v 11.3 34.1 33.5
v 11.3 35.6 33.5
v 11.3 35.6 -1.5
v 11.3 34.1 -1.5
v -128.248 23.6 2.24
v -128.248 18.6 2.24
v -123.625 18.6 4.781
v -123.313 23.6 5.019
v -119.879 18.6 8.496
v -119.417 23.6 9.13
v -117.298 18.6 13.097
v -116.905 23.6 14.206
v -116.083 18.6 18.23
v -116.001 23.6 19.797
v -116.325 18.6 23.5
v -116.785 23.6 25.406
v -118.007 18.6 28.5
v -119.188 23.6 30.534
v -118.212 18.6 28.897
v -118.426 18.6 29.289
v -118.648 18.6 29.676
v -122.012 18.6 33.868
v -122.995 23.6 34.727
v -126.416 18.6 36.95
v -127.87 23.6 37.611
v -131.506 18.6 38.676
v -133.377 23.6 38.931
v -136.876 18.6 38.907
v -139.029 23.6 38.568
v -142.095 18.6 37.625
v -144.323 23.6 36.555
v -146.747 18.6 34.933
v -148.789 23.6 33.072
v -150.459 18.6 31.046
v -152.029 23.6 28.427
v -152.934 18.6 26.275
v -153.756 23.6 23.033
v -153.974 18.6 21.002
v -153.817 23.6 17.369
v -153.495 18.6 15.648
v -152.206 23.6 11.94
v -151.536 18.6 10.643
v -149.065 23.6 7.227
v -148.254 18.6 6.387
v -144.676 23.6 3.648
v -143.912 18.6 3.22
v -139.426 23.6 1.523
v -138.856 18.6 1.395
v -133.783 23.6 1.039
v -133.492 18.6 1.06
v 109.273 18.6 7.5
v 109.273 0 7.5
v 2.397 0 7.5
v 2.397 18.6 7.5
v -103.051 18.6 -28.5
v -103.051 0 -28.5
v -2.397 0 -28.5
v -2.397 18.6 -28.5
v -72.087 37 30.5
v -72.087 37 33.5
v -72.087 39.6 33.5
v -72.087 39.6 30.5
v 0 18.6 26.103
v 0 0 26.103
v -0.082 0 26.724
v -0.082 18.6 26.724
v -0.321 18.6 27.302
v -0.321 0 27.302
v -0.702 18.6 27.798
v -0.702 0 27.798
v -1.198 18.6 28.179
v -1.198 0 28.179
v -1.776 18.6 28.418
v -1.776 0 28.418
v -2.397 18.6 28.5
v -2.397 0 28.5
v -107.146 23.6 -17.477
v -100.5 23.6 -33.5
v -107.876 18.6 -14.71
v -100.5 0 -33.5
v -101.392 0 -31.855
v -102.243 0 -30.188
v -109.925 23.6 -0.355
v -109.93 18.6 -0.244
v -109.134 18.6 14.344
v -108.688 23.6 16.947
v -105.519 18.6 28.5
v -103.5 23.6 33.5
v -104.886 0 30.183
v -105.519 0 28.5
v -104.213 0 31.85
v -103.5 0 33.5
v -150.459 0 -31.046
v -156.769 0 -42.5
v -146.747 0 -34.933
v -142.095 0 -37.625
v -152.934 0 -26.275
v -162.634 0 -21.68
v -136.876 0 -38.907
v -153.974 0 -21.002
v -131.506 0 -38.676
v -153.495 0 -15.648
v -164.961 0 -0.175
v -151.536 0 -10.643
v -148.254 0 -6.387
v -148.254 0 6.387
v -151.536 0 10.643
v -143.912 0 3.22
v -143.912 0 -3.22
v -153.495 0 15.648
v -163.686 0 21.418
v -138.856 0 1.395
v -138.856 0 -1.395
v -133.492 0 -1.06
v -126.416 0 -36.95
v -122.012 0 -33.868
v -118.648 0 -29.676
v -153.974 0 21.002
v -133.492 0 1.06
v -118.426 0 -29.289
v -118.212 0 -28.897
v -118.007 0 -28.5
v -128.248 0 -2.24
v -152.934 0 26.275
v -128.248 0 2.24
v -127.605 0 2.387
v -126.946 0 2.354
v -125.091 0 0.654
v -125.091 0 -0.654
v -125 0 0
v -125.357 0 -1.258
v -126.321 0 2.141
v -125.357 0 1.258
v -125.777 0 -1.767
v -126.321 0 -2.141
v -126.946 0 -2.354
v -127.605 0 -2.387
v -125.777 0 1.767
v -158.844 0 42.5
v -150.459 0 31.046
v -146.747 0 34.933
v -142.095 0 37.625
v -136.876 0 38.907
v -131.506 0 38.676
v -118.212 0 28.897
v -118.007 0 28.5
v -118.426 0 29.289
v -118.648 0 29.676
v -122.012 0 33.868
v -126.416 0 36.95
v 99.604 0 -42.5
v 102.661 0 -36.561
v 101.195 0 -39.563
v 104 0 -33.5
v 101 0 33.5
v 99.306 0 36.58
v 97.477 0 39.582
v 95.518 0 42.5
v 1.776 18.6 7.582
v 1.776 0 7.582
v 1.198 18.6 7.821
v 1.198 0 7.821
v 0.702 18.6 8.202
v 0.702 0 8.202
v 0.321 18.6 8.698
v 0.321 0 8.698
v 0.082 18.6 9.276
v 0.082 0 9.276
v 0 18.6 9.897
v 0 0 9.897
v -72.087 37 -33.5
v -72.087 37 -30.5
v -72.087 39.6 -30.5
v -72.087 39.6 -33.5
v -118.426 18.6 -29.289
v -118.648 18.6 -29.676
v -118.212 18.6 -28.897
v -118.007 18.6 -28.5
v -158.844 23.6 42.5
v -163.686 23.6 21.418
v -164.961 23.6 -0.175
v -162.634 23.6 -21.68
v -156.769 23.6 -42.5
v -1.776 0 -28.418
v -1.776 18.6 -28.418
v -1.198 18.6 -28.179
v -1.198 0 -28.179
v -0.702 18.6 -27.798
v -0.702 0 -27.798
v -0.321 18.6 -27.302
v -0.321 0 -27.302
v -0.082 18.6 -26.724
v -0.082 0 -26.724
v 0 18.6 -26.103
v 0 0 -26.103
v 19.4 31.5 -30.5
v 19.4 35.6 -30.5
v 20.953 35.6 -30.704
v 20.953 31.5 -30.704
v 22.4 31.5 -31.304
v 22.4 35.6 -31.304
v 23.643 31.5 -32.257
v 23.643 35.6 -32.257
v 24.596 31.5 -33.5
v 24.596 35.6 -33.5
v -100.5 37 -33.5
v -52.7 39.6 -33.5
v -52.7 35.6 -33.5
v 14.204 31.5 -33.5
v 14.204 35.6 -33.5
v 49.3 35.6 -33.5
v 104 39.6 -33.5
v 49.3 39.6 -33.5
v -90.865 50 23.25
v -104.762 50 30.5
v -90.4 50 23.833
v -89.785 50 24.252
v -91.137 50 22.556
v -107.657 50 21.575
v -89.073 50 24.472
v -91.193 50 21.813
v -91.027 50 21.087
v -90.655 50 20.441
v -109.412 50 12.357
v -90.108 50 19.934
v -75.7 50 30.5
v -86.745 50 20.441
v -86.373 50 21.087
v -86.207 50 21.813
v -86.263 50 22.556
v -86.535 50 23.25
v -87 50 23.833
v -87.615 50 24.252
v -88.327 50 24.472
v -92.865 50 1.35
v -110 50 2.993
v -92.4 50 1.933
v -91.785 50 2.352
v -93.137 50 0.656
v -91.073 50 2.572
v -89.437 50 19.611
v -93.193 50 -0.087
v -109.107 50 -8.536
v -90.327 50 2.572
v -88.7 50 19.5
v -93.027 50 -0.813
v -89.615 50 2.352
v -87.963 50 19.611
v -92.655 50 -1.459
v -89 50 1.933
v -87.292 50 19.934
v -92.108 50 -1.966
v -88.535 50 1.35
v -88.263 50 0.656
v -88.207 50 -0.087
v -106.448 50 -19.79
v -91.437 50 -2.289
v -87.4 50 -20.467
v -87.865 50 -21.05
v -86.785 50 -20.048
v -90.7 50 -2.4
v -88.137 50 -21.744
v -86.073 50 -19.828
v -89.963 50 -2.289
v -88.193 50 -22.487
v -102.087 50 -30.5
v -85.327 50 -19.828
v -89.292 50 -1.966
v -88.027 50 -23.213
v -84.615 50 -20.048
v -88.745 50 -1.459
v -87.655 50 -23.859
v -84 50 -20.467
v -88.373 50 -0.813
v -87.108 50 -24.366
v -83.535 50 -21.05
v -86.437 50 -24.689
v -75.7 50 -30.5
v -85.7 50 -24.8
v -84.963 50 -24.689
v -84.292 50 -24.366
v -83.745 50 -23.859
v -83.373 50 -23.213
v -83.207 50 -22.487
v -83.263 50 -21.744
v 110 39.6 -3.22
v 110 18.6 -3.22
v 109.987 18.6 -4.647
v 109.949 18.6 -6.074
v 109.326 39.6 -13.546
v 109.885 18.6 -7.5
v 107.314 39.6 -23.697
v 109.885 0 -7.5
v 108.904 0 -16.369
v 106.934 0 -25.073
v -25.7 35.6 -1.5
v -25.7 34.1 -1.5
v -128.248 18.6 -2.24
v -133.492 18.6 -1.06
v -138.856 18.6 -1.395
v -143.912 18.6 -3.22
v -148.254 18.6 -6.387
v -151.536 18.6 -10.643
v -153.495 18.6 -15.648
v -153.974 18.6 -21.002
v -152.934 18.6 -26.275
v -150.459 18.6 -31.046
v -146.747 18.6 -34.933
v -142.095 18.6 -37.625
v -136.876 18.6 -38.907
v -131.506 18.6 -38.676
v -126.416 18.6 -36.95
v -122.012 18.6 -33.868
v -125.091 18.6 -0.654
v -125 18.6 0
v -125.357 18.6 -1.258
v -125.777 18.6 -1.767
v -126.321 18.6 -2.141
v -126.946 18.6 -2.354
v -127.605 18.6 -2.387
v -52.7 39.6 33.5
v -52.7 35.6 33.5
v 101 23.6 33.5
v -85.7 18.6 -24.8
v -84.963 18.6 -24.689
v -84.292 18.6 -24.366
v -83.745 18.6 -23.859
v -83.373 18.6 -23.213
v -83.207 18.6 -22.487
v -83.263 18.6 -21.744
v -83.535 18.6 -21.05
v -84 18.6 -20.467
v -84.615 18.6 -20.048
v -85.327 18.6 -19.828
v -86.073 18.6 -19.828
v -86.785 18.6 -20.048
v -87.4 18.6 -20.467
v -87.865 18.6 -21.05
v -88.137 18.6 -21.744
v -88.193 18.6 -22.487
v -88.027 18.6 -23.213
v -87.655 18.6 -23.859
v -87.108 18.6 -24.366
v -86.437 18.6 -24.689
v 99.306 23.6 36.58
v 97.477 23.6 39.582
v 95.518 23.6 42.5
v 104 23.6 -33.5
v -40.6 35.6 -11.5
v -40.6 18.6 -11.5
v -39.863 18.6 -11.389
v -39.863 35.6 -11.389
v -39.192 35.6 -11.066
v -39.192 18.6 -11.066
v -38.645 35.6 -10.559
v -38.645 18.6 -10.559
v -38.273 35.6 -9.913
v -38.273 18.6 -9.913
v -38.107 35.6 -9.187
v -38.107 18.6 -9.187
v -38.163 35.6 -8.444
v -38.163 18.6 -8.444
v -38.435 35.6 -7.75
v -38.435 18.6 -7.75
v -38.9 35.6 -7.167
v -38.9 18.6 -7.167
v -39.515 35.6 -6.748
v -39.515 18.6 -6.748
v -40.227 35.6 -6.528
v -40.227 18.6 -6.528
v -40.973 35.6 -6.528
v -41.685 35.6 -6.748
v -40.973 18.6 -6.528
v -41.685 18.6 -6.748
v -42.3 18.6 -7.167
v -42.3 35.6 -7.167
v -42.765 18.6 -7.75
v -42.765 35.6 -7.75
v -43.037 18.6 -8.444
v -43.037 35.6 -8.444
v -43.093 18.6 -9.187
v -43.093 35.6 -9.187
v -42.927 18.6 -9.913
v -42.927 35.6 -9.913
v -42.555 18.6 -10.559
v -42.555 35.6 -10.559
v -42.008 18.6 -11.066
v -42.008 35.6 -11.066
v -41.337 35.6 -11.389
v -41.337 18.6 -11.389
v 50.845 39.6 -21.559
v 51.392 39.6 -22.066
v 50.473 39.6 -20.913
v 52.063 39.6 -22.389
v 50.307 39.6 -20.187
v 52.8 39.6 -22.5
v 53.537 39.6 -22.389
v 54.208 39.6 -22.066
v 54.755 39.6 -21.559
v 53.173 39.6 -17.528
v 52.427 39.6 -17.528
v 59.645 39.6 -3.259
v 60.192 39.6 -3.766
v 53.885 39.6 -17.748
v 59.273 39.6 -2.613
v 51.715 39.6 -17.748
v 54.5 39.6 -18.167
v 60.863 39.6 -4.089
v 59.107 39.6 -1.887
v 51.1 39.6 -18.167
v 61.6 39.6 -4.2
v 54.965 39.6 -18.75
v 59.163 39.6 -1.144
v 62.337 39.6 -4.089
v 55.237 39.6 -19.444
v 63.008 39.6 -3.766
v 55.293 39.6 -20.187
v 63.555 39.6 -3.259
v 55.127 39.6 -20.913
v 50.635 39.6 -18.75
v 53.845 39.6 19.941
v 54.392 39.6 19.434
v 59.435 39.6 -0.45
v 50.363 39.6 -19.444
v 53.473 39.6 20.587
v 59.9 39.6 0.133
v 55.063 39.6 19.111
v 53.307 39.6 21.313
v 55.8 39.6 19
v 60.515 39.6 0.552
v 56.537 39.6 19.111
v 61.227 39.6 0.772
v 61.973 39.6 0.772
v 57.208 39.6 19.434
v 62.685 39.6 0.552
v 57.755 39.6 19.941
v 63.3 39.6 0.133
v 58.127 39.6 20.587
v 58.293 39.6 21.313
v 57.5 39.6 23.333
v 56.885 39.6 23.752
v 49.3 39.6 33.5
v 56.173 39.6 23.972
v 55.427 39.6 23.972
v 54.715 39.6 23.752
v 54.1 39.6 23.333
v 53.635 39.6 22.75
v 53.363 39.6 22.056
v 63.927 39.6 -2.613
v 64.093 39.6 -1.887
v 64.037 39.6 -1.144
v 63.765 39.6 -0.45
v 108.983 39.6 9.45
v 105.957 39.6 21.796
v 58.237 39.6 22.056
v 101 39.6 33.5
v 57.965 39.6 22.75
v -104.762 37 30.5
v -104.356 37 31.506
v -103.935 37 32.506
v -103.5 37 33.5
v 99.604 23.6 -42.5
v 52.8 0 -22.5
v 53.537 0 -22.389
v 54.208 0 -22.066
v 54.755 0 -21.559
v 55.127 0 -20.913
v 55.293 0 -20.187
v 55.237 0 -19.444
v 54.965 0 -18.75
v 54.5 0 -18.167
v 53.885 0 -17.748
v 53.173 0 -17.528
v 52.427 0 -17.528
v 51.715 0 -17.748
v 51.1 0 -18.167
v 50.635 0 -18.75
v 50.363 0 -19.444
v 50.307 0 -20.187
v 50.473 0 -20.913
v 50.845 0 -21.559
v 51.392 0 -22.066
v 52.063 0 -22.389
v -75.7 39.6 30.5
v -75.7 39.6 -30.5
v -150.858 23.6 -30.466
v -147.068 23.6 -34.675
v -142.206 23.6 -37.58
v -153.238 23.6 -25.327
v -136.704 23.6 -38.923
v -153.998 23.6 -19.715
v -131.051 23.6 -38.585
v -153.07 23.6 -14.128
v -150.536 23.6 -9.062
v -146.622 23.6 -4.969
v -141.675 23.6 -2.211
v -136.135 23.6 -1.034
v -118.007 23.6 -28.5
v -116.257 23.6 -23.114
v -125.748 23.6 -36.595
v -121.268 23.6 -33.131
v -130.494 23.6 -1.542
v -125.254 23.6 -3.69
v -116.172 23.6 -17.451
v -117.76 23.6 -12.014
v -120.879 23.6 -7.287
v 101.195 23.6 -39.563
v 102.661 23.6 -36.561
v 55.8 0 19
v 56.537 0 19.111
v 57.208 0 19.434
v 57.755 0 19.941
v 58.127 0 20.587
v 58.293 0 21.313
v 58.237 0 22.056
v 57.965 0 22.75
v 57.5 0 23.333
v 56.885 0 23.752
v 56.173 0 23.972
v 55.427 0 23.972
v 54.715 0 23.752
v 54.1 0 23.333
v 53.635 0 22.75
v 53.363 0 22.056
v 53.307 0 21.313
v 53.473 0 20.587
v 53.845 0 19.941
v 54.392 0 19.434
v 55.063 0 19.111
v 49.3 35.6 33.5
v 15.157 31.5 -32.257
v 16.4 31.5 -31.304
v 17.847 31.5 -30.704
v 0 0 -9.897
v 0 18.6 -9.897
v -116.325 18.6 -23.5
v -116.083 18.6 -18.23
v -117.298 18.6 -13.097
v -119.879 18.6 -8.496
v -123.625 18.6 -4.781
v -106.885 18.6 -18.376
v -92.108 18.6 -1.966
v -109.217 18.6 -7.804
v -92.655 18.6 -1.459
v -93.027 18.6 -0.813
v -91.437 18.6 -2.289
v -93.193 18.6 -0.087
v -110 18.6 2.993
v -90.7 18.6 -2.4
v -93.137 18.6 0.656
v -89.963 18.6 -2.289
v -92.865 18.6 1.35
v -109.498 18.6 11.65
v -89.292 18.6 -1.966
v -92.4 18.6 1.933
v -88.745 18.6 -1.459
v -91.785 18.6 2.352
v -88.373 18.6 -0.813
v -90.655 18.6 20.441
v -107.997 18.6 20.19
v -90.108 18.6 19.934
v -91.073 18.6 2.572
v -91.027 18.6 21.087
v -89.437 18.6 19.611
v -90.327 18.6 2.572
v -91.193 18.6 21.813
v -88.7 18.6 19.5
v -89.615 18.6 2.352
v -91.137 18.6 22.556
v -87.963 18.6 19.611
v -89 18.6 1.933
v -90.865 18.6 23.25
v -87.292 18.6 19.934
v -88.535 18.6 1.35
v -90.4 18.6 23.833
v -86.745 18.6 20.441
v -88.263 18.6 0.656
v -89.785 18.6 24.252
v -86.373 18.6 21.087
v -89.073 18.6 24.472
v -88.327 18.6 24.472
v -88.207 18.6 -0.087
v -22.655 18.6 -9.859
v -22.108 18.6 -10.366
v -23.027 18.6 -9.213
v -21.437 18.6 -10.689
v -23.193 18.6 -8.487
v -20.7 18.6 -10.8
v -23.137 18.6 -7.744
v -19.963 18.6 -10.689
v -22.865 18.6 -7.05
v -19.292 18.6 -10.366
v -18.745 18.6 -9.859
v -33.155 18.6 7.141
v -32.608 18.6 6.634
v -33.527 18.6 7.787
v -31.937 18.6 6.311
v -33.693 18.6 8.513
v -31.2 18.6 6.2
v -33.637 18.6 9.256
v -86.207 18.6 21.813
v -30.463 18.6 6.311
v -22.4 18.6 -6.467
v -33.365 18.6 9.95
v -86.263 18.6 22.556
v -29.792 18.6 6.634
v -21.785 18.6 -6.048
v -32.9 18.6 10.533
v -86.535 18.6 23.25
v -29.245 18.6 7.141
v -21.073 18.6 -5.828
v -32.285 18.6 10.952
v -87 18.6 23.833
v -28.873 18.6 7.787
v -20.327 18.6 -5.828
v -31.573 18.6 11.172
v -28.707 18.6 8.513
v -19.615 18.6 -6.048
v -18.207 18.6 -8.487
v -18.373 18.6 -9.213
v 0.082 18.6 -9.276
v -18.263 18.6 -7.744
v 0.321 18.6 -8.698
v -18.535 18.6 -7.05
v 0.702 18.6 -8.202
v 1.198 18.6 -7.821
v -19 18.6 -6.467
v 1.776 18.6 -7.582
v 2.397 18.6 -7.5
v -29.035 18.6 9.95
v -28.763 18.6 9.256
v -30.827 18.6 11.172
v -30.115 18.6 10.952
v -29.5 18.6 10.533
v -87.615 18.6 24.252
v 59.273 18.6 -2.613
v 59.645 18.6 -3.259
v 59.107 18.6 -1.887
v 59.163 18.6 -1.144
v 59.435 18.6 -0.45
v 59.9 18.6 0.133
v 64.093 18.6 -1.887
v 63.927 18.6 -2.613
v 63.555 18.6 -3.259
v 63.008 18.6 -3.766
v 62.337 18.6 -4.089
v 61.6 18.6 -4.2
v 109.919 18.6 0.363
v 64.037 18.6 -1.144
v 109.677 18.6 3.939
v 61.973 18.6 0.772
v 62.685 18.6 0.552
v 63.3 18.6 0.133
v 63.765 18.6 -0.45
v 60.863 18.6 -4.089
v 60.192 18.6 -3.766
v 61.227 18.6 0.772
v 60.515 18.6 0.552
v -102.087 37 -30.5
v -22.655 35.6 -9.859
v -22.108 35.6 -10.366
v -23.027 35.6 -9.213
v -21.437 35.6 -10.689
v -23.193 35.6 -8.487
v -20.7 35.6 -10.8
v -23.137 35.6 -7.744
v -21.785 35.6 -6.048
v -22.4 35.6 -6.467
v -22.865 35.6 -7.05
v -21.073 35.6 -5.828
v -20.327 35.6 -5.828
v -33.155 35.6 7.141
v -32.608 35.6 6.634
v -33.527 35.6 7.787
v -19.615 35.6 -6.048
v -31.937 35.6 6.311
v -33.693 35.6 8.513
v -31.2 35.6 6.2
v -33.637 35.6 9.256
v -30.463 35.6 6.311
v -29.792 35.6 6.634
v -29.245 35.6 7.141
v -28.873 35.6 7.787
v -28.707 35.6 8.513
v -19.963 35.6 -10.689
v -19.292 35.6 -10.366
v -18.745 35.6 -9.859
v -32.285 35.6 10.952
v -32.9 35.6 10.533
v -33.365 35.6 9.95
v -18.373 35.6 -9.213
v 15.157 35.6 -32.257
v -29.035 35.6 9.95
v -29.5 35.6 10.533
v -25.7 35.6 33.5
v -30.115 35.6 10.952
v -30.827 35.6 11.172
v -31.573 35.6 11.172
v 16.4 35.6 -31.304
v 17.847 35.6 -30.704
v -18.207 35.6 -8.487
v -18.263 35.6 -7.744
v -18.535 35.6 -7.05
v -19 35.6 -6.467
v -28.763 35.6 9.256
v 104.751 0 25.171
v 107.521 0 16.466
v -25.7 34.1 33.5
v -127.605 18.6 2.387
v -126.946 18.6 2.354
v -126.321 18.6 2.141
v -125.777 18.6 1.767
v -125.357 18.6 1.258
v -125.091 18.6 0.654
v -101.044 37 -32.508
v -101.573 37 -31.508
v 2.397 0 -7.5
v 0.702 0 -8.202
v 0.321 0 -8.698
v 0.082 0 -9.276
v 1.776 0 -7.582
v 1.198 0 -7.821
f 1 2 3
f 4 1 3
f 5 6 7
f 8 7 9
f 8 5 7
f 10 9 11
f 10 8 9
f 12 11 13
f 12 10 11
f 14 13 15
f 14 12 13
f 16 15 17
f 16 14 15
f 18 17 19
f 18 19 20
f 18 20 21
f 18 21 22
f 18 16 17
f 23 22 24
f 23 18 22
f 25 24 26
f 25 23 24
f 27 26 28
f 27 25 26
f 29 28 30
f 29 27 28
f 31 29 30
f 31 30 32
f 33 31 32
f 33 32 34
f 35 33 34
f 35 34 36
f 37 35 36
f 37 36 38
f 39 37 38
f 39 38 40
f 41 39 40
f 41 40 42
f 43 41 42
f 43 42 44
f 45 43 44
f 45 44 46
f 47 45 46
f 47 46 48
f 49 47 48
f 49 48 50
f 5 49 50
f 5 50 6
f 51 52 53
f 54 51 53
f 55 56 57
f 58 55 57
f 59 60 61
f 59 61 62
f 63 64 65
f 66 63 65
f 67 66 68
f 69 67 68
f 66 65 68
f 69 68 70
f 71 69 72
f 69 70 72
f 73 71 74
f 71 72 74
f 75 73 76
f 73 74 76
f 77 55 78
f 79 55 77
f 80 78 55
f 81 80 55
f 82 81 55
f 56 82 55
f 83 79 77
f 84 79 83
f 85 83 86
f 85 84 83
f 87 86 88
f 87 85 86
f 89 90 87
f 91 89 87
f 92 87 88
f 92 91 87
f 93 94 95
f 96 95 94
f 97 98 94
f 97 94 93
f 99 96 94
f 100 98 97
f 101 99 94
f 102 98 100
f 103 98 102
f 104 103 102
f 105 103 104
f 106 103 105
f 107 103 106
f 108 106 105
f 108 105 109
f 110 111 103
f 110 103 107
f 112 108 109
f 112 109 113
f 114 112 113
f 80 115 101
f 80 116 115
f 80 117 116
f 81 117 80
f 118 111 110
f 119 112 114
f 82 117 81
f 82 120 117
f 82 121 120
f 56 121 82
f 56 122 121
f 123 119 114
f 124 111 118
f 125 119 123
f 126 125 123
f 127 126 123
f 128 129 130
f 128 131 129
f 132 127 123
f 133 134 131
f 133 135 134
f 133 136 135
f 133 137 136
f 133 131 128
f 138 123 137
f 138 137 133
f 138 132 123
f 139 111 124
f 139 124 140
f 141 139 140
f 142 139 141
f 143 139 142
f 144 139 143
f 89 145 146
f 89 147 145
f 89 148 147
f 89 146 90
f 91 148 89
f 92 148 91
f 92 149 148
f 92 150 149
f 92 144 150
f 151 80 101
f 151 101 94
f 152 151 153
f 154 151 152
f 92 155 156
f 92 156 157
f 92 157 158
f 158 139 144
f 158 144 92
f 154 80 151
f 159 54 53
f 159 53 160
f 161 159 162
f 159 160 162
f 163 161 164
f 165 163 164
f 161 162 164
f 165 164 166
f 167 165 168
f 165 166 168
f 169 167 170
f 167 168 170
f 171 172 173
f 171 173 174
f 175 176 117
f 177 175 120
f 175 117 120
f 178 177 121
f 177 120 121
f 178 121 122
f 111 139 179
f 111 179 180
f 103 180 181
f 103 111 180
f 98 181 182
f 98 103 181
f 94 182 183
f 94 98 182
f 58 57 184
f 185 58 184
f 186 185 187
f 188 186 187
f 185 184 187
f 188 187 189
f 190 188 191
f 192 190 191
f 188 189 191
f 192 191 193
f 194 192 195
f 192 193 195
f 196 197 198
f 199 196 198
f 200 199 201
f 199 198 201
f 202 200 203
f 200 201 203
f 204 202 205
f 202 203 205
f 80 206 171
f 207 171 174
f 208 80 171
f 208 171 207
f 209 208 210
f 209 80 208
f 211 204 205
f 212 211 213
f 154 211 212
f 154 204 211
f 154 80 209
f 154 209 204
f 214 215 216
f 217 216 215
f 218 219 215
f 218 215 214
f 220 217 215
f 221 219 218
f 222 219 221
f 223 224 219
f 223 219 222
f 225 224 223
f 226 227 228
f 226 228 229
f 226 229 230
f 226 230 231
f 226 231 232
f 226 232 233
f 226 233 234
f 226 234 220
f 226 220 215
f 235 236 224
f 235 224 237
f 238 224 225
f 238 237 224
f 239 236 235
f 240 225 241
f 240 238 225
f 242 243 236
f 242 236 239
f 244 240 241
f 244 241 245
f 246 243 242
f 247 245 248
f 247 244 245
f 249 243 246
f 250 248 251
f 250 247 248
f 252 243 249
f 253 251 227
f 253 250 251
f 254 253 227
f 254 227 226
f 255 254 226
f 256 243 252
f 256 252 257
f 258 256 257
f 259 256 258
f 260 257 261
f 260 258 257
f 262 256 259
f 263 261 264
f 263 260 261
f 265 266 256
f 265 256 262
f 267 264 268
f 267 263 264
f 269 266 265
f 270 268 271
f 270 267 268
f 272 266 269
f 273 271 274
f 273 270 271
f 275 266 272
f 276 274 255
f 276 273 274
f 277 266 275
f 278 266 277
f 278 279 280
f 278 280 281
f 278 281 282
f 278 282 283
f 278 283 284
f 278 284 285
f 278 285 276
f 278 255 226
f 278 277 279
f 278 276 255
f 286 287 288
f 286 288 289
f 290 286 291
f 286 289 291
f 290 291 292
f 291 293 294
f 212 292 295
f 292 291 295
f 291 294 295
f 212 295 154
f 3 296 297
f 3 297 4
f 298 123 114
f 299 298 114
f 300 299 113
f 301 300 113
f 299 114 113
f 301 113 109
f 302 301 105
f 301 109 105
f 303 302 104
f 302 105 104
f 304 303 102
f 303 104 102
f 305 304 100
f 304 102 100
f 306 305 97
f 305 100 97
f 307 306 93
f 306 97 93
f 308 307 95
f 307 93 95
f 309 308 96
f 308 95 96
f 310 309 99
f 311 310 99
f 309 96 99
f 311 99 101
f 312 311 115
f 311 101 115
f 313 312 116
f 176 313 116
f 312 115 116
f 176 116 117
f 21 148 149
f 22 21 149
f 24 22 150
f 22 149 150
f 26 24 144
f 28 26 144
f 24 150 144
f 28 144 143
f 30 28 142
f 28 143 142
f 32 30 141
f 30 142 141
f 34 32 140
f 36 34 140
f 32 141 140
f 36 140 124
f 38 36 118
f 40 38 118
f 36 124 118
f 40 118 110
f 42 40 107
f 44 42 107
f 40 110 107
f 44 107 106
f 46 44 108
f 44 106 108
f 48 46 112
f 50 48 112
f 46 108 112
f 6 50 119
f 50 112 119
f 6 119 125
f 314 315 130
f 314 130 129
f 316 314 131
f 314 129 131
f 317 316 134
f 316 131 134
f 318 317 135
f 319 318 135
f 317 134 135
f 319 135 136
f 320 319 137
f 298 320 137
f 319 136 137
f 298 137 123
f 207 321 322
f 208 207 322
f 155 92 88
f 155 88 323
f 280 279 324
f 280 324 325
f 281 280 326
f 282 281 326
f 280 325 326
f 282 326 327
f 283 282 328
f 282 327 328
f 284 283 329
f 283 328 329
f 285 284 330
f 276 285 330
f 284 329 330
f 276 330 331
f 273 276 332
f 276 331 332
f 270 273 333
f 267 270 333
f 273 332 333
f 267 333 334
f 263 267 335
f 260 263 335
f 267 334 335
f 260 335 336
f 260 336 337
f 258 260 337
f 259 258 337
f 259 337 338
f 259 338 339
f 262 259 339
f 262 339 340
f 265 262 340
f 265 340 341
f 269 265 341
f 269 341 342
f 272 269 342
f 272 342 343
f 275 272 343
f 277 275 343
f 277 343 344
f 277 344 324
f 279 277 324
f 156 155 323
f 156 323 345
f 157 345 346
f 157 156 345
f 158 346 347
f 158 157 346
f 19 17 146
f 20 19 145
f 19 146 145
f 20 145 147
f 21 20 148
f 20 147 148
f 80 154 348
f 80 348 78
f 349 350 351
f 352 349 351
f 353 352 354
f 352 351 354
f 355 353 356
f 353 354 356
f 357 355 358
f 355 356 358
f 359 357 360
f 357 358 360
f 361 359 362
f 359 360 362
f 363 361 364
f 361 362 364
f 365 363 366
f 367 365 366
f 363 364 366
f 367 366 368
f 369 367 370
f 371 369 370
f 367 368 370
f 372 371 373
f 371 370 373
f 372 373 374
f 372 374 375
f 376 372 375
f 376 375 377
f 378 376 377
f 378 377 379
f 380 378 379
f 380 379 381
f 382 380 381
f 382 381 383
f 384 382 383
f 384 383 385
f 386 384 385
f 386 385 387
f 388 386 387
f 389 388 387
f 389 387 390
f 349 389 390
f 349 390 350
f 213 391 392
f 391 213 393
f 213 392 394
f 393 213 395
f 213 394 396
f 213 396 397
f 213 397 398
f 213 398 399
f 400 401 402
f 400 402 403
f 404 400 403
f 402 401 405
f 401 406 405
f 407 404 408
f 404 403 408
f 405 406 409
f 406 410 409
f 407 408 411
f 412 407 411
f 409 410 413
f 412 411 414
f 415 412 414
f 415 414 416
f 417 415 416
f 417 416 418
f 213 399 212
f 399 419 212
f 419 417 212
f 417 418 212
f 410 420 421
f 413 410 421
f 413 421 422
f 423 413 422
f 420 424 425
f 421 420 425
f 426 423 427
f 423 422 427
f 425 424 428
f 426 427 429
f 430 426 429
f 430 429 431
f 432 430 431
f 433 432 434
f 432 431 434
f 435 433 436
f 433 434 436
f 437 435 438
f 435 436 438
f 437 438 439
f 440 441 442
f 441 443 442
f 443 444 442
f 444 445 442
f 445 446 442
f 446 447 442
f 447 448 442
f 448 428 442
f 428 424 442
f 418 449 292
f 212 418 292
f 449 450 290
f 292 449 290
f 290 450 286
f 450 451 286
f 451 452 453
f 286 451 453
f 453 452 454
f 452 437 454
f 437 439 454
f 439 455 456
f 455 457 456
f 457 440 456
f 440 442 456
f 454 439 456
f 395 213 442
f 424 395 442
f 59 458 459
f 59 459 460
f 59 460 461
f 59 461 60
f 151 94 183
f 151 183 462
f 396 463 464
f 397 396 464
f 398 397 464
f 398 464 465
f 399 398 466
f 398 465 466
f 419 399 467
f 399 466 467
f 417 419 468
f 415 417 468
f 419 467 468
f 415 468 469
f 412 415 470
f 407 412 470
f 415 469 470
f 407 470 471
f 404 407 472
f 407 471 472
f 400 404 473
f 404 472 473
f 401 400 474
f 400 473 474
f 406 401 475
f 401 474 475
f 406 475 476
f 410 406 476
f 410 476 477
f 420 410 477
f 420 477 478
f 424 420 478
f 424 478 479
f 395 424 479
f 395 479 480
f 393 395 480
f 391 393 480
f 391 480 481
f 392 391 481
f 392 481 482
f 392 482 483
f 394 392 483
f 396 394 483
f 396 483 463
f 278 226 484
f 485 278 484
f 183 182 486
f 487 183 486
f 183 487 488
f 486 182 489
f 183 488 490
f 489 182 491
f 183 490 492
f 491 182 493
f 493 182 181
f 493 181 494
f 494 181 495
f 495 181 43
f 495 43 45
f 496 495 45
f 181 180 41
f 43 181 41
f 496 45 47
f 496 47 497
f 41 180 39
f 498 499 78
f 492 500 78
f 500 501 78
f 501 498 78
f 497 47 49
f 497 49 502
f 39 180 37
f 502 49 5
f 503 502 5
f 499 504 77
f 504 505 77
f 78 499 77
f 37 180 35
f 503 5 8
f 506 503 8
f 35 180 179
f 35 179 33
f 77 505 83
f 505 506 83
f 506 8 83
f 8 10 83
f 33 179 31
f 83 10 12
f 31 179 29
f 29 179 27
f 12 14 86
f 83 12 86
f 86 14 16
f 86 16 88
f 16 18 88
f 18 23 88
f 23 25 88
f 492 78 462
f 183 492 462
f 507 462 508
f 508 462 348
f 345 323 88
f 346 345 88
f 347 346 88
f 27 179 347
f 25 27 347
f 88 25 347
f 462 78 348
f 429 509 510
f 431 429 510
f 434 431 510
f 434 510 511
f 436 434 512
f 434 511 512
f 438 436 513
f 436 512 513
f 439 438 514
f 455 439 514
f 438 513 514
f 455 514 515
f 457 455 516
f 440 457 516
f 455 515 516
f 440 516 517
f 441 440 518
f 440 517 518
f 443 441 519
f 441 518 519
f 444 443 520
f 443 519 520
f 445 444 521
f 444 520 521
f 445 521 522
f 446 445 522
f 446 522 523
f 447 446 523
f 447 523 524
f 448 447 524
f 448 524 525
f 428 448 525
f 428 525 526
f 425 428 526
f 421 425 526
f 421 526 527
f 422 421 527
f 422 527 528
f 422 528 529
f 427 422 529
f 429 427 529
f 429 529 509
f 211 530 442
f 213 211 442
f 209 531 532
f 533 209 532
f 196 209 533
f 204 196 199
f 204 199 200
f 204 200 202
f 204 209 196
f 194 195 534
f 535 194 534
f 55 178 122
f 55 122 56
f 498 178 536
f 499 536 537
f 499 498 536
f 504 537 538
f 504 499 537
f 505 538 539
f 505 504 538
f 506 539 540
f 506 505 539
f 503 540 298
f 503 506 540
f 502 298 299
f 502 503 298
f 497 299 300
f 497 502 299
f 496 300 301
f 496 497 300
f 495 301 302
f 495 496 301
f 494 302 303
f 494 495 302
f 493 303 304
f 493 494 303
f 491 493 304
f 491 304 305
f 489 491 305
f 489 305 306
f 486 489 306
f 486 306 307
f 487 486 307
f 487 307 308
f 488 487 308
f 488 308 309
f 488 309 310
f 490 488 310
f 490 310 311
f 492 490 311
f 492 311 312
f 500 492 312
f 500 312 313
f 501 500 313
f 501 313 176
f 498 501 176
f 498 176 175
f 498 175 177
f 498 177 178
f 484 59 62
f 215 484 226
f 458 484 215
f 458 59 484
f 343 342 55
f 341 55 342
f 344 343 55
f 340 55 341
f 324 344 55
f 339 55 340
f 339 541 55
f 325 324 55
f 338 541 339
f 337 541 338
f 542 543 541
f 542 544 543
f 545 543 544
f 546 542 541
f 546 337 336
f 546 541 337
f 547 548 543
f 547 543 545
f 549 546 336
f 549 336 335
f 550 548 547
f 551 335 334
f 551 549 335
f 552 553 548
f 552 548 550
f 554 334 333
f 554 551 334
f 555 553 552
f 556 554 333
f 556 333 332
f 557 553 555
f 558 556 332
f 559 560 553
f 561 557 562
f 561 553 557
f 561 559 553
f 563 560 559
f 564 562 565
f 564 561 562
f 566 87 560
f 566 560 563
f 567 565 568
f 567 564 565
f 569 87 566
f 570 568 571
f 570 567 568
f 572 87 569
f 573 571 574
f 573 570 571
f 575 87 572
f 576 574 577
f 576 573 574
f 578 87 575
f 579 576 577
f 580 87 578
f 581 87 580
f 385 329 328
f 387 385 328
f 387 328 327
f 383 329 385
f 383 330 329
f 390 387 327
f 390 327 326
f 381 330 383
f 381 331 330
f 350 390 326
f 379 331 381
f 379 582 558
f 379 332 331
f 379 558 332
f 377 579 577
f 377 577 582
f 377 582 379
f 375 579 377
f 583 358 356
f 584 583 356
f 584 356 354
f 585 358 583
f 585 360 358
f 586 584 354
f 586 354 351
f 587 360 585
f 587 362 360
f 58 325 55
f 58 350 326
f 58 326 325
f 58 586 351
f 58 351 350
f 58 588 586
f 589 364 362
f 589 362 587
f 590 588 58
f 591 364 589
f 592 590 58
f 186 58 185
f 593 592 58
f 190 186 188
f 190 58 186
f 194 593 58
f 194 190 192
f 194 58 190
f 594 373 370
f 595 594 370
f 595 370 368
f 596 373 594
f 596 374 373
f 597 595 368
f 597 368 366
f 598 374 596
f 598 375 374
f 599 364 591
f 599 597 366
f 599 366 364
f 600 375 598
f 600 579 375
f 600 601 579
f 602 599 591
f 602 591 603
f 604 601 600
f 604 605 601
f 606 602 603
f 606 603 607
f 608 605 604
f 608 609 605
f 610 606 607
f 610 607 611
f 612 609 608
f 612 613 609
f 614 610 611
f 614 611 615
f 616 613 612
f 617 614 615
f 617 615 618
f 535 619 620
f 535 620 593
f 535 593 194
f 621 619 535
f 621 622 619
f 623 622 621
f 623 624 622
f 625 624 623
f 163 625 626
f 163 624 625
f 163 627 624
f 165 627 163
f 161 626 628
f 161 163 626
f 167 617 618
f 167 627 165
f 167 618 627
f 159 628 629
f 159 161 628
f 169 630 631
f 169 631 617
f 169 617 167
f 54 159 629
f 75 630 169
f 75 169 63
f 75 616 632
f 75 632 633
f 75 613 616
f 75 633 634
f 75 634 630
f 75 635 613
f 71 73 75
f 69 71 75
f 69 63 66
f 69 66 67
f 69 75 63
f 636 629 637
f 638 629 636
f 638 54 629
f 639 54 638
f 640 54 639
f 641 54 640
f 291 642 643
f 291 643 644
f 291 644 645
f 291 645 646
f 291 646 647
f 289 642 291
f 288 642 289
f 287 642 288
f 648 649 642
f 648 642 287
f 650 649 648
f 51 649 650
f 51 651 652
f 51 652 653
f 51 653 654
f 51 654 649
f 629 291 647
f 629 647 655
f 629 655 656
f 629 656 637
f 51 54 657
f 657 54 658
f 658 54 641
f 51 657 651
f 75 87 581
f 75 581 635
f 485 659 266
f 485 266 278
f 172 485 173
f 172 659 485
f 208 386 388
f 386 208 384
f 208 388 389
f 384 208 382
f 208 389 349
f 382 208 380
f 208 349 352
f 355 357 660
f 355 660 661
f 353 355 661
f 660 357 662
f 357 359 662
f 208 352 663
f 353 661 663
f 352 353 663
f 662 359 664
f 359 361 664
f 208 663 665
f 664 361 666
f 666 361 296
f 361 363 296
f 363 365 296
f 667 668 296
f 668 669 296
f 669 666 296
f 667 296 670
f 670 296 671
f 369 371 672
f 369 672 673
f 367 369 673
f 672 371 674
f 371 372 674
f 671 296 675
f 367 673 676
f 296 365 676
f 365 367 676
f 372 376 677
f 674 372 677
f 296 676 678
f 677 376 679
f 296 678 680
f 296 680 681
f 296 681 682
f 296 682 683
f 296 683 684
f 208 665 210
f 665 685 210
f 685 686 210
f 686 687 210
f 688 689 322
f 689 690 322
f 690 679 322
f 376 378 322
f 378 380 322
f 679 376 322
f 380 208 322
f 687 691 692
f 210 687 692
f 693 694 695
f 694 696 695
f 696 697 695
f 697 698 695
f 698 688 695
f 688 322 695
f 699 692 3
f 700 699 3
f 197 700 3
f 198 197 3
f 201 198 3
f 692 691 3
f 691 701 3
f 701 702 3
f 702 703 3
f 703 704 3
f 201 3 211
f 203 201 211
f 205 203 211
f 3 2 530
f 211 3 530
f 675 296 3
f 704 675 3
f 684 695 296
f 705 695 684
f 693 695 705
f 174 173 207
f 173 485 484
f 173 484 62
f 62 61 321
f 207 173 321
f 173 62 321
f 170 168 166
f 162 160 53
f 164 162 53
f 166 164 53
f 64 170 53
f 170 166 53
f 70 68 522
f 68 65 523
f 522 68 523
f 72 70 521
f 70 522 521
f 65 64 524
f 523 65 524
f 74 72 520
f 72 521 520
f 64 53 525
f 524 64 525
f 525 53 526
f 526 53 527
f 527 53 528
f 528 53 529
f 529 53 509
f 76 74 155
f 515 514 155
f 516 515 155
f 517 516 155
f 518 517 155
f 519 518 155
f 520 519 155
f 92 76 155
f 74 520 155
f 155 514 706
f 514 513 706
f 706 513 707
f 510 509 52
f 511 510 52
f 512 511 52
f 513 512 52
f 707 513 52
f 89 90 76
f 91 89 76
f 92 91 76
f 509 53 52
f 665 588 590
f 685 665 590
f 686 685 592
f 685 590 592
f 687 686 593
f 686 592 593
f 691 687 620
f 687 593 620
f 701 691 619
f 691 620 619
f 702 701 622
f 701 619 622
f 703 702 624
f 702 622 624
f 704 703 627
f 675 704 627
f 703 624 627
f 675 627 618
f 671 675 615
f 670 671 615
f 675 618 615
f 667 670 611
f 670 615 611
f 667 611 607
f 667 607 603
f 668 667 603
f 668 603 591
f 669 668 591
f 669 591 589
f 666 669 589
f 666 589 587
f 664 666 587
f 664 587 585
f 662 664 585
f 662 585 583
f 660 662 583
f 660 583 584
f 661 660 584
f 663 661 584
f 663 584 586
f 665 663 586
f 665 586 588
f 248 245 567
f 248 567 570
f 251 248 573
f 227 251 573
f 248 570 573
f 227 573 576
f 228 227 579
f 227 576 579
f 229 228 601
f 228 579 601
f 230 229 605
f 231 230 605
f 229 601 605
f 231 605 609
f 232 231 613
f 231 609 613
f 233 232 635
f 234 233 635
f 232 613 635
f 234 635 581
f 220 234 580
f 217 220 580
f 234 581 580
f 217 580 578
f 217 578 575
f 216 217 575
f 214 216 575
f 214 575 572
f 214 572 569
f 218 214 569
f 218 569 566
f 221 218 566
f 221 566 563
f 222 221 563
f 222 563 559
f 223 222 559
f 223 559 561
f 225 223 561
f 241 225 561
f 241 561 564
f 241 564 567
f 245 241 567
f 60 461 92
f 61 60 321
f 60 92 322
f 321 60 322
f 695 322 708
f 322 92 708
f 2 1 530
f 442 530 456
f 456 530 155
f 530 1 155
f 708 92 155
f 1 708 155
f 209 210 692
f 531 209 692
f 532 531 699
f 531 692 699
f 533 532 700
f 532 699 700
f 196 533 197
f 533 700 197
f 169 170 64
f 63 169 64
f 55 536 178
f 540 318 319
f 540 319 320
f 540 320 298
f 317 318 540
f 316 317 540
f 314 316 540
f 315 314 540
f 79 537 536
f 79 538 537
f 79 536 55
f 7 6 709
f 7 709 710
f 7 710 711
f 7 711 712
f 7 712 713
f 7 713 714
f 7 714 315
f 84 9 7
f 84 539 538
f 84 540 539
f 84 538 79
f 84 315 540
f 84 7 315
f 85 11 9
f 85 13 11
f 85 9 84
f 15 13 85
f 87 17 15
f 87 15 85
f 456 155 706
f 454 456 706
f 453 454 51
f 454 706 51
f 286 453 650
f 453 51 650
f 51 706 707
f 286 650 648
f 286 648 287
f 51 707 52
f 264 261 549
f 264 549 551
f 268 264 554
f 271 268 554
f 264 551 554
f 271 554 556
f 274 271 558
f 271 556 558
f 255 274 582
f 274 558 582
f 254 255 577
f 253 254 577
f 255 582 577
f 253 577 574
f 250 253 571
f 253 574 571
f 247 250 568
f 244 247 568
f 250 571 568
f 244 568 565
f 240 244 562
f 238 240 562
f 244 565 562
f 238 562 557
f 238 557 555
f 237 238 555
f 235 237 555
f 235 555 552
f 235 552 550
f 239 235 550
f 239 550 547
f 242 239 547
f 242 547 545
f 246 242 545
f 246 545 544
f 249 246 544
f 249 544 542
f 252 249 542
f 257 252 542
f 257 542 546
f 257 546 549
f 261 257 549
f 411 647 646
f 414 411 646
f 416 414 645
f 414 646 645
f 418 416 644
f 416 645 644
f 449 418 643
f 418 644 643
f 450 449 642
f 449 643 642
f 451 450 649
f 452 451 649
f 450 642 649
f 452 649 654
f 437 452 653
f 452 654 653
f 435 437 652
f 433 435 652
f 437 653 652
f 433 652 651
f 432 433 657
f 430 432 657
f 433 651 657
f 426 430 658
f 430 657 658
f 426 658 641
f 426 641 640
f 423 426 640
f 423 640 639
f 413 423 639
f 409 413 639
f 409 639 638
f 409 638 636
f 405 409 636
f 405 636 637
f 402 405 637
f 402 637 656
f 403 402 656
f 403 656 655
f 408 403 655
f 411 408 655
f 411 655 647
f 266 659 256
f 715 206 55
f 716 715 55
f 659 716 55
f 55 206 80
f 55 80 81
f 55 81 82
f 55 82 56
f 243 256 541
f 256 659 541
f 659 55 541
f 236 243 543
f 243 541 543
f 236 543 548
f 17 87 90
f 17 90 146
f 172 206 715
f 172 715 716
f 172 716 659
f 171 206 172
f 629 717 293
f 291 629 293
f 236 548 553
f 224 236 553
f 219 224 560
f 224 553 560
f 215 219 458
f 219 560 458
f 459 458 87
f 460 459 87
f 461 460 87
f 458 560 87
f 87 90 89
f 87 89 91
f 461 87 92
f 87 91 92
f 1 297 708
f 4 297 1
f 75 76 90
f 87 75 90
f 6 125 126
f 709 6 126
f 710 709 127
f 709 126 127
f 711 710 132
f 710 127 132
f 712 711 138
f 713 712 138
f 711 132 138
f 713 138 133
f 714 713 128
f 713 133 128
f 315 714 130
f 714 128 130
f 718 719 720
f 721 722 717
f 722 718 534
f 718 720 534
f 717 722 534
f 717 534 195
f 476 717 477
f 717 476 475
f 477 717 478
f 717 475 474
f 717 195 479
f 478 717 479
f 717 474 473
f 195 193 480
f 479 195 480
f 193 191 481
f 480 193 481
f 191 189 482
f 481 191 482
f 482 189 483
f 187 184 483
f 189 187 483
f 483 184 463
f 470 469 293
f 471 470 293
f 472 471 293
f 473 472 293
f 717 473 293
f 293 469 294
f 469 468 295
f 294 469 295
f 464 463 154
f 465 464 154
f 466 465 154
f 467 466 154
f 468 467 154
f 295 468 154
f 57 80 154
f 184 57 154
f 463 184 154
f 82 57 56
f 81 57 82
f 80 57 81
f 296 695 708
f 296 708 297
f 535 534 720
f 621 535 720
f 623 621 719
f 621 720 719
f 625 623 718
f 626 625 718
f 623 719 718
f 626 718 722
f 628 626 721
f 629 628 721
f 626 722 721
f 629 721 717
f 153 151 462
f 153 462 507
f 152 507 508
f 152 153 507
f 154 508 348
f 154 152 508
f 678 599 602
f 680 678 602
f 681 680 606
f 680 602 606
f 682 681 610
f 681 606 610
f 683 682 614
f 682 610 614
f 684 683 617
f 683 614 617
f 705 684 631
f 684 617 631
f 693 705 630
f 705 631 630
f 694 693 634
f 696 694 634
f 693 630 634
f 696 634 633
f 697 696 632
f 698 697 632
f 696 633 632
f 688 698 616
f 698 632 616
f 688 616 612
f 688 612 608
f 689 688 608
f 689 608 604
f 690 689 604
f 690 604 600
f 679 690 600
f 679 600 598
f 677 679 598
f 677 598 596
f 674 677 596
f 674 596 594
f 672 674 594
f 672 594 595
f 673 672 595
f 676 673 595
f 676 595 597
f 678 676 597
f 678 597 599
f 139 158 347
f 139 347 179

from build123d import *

# Parameters (mm, degrees)
SKETCH1_W           = 220
SKETCH1_H           = 67
BOSS_EXTRUDE1_DEPTH = 50
CUT_EXTRUDE1_DEPTH  = 126.388396592
CUT_EXTRUDE2_DEPTH  = 139.162947276
CUT_EXTRUDE3_START  = -13
SKETCH4_W           = 3.612655346
SKETCH4_H           = 3
CUT_EXTRUDE3_DEPTH  = 13
SKETCH6_R           = 2.5
CUT_EXTRUDE4_DEPTH  = 126.388396592
SKETCH7_W           = 37
SKETCH7_H           = 35
CUT_EXTRUDE5_DEPTH  = 1.5
CUT_EXTRUDE6_DEPTH  = 18.5
BOSS_EXTRUDE2_DEPTH = 23.6
SKETCH9_R           = 2.5
SKETCH9_R_2         = 2.396551724
CUT_EXTRUDE7_DEPTH  = 18.6
CUT_EXTRUDE8_START  = -23.6
SKETCH12_R          = 19
CUT_EXTRUDE8_DEPTH  = 5


with BuildPart() as part:
    # Sketch1 → Boss-Extrude1 (new body)
    with BuildSketch(Plane(origin=(0, 0, 0), x_dir=(1, 0, 0), z_dir=(0, 1, 0))):
        Rectangle(SKETCH1_W, SKETCH1_H)
    extrude(amount=BOSS_EXTRUDE1_DEPTH)

    # Sketch2 → Cut-Extrude1 (cut, through all)
    with BuildSketch(Plane.XZ):
        with BuildLine():
            Line((110, -3.219751644), (110, 33.5))
            Line((110, 33.5), (101, 33.5))
            ThreePointArc((101, 33.5), (107.717186872, 15.683556008), (110, -3.219751644))
        make_face()
        with BuildLine():
            Line((110, -33.5), (110, -3.219751644))
            ThreePointArc((110, -3.219751644), (108.485558513, -18.65423771), (104, -33.5))
            Line((104, -33.5), (110, -33.5))
        make_face()
        with BuildLine():
            ThreePointArc((-100.5, -33.5), (-107.586070475, -15.861694701), (-110, 2.992884395))
            Line((-110, 2.992884395), (-110, -33.5))
            Line((-110, -33.5), (-100.5, -33.5))
        make_face()
        with BuildLine():
            ThreePointArc((-110, 2.992884395), (-108.356964685, 18.588830202), (-103.5, 33.5))
            Line((-103.5, 33.5), (-110, 33.5))
            Line((-110, 33.5), (-110, 2.992884395))
        make_face()
    extrude(amount=-CUT_EXTRUDE1_DEPTH, mode=Mode.SUBTRACT)

    # Sketch3 → Cut-Extrude2 (cut, through all)
    with BuildSketch(Plane(origin=(0, 0, 33.5), x_dir=(-1, 0, 0), z_dir=(0, 0, -1))):
        Polygon((75.7, 50), (75.7, 39.6), (52.7, 39.6), (52.7, 35.6), (-49.3, 35.6), (-49.3, 39.6), (-110, 39.6), (-110, 50), align=None)
    extrude(amount=CUT_EXTRUDE2_DEPTH, mode=Mode.SUBTRACT)

    # Sketch4 → Cut-Extrude3 (cut)
    with BuildSketch(Plane(origin=(0, 50, 0), x_dir=(1, 0, 0), z_dir=(0, 1, 0)).offset(CUT_EXTRUDE3_START)):
        with BuildLine():
            Line((-75.7, 30.5), (-75.7, 33.5))
            Line((-75.7, 33.5), (-100.5, 33.5))
            ThreePointArc((-100.5, 33.5), (-101.310680862, 32.008999469), (-102.087344654, 30.5))
            Line((-102.087344654, 30.5), (-75.7, 30.5))
        make_face()
        with Locations((-73.893672327, 32)):
            Rectangle(SKETCH4_W, SKETCH4_H)
        with BuildLine():
            Line((-75.7, -33.5), (-75.7, -30.5))
            Line((-75.7, -30.5), (-104.761692194, -30.5))
            ThreePointArc((-104.761692194, -30.5), (-104.147155152, -32.006859002), (-103.5, -33.5))
            Line((-103.5, -33.5), (-75.7, -33.5))
        make_face()
        with Locations((-73.893672327, -32)):
            Rectangle(SKETCH4_W, SKETCH4_H)
    extrude(amount=CUT_EXTRUDE3_DEPTH, mode=Mode.SUBTRACT)

    # Sketch6 → Cut-Extrude4 (cut, through all)
    with BuildSketch(Plane.XZ):
        with Locations(Location((-40.6, -9, 0), (0, 0, 270))):
            Circle(SKETCH6_R)
        with Locations(Location((-20.7, -8.3, 0), (0, 0, 270))):
            Circle(SKETCH6_R)
        with Locations(Location((-31.2, 8.7, 0), (0, 0, 270))):
            Circle(SKETCH6_R)
        with Locations(Location((-88.7, 22, 0), (0, 0, 270))):
            Circle(SKETCH6_R)
        with Locations(Location((-90.7, 0.1, 0), (0, 0, 270))):
            Circle(SKETCH6_R)
        with Locations(Location((-85.7, -22.3, 0), (0, 0, 270))):
            Circle(SKETCH6_R)
        with Locations(Location((52.8, -20, 0), (0, 0, 270))):
            Circle(SKETCH6_R)
        with Locations(Location((61.6, -1.7, 0), (0, 0, 270))):
            Circle(SKETCH6_R)
        with Locations(Location((55.8, 21.5, 0), (0, 0, 270))):
            Circle(SKETCH6_R)
    extrude(amount=-CUT_EXTRUDE4_DEPTH, mode=Mode.SUBTRACT)

    # Sketch7 → Cut-Extrude5 (cut)
    with BuildSketch(Plane(origin=(0, 35.6, 0), x_dir=(1, 0, 0), z_dir=(0, 1, 0))):
        with Locations((-7.2, -16)):
            Rectangle(SKETCH7_W, SKETCH7_H)
    extrude(amount=-CUT_EXTRUDE5_DEPTH, mode=Mode.SUBTRACT)

    # Sketch8 → Cut-Extrude6 (cut)
    with BuildSketch(Plane(origin=(0, 50, 0), x_dir=(1, 0, 0), z_dir=(0, 1, 0))):
        with BuildLine():
            Line((24.596152423, 33.5), (19.4, 33.5))
            Line((19.4, 33.5), (19.4, 30.5))
            ThreePointArc((19.4, 30.5), (22.4, 31.303847577), (24.596152423, 33.5))
        make_face()
        with BuildLine():
            Line((19.4, 33.5), (14.203847577, 33.5))
            ThreePointArc((14.203847577, 33.5), (16.4, 31.303847577), (19.4, 30.5))
            Line((19.4, 30.5), (19.4, 33.5))
        make_face()
    extrude(amount=-CUT_EXTRUDE6_DEPTH, mode=Mode.SUBTRACT)


with BuildPart() as body_2:
    # Sketch10 → Boss-Extrude2 (new body)
    with BuildSketch(Plane.XZ):
        with BuildLine():
            Line((-34.333135379, 42.5), (-98.722865603, 42.5))
            ThreePointArc((-98.722865603, 42.5), (-101.264774078, 38.081392432), (-103.5, 33.5))
            Line((-103.5, 33.5), (-39.81557342, 33.5))
            ThreePointArc((-39.81557342, 33.5), (-37.223820086, 38.091048485), (-34.333135379, 42.5))
        make_face()
        with BuildLine():
            Line((28.405035228, 42.5), (-34.333135379, 42.5))
            ThreePointArc((-34.333135379, 42.5), (-37.223820086, 38.091048485), (-39.81557342, 33.5))
            Line((-39.81557342, 33.5), (33.182169625, 33.5))
            ThreePointArc((33.182169625, 33.5), (30.946943703, 38.081392432), (28.405035228, 42.5))
        make_face()
        with BuildLine():
            Line((88.525744823, 42.5), (28.405035228, 42.5))
            ThreePointArc((28.405035228, 42.5), (30.946943703, 38.081392432), (33.182169625, 33.5))
            Line((33.182169625, 33.5), (91.047357251, 33.5))
            ThreePointArc((91.047357251, 33.5), (89.867560129, 38.022697059), (88.525744823, 42.5))
        make_face()
        with BuildLine():
            Line((95.517561959, 42.5), (88.525744823, 42.5))
            ThreePointArc((88.525744823, 42.5), (89.867560129, 38.022697059), (91.047357251, 33.5))
            Line((91.047357251, 33.5), (101, 33.5))
            ThreePointArc((101, 33.5), (98.408246666, 38.091048485), (95.517561959, 42.5))
        make_face()
        with BuildLine():
            Line((86.451548074, -42.5), (99.604231658, -42.5))
            ThreePointArc((99.604231658, -42.5), (101.944159442, -38.069376757), (104, -33.5))
            Line((104, -33.5), (89.448374703, -33.5))
            ThreePointArc((89.448374703, -33.5), (88.032178207, -38.027376617), (86.451548074, -42.5))
        make_face()
        with BuildLine():
            Line((89.448374703, -33.5), (30.182169625, -33.5))
            ThreePointArc((30.182169625, -33.5), (27.387289581, -38.106510308), (24.268228824, -42.5))
            Line((24.268228824, -42.5), (86.451548074, -42.5))
            ThreePointArc((86.451548074, -42.5), (88.032178207, -38.027376617), (89.448374703, -33.5))
        make_face()
        with BuildLine():
            Line((-42.81557342, -33.5), (-100.5, -33.5))
            ThreePointArc((-100.5, -33.5), (-97.705119956, -38.106510308), (-94.586059199, -42.5))
            Line((-94.586059199, -42.5), (-38.419805078, -42.5))
            ThreePointArc((-38.419805078, -42.5), (-40.759732861, -38.069376757), (-42.81557342, -33.5))
        make_face()
        with BuildLine():
            Line((30.182169625, -33.5), (-42.81557342, -33.5))
            ThreePointArc((-42.81557342, -33.5), (-40.759732861, -38.069376757), (-38.419805078, -42.5))
            Line((-38.419805078, -42.5), (24.268228824, -42.5))
            ThreePointArc((24.268228824, -42.5), (27.387289581, -38.106510308), (30.182169625, -33.5))
        make_face()
        with BuildLine():
            ThreePointArc((-103.5, 33.5), (-101.264774078, 38.081392432), (-98.722865603, 42.5))
            Line((-98.722865603, 42.5), (-158.843575198, 42.5))
            ThreePointArc((-158.843575198, 42.5), (-164.961358829, -0.174595682), (-156.769378449, -42.5))
            Line((-156.769378449, -42.5), (-94.586059199, -42.5))
            ThreePointArc((-94.586059199, -42.5), (-97.705119956, -38.106510308), (-100.5, -33.5))
            ThreePointArc((-100.5, -33.5), (-109.925088146, -0.354854693), (-103.5, 33.5))
        make_face()
    extrude(amount=-BOSS_EXTRUDE2_DEPTH)


with BuildPart() as cut_extrude7_tool:
    # Sketch9 → Cut-Extrude7 (new body)
    # profile 1 of 17: a face of its own
    with BuildSketch(Plane.XZ):
        with BuildLine():
            ThreePointArc((-128.248186972, 2.240128918), (-126.585767055, 2.964722369), (-125, 3.844505579))
            Line((-125, 3.844505579), (-125, 28.5))
            Line((-125, 28.5), (-118.007354532, 28.5))
            ThreePointArc((-118.007354532, 28.5), (-118.317527246, 29.093684777), (-118.648433766, 29.67606747))
            ThreePointArc((-118.648433766, 29.67606747), (-152.933884531, 26.275012798), (-128.248186972, 2.240128918))
        make_face()
    # profile 2 of 17: a face of its own
    with BuildSketch(Plane.XZ):
        with BuildLine():
            Line((-125, 28.5), (-125, 3.844505579))
            ThreePointArc((-125, 3.844505579), (-118.401807327, 10.753378996), (-116, 20))
            ThreePointArc((-116, 20), (-116.508647103, 24.366906005), (-118.007354532, 28.5))
            Line((-118.007354532, 28.5), (-125, 28.5))
        make_face()
    # profile 3 of 17: a face of its own
    with BuildSketch(Plane.XZ):
        with BuildLine():
            Line((-125, -3.844505579), (-125, -28.5))
            Line((-125, -28.5), (-118.007354532, -28.5))
            ThreePointArc((-118.007354532, -28.5), (-116.508647103, -24.366906005), (-116, -20))
            ThreePointArc((-116, -20), (-118.401807327, -10.753378996), (-125, -3.844505579))
        make_face()
    # profile 4 of 17: a face of its own
    with BuildSketch(Plane.XZ):
        with BuildLine():
            Line((-118.007354532, -28.5), (-125, -28.5))
            Line((-125, -28.5), (-125, -3.844505579))
            ThreePointArc((-125, -3.844505579), (-126.58576708, -2.964722357), (-128.248187023, -2.240128899))
            ThreePointArc((-128.248187023, -2.240128899), (-152.933884587, -26.275012638), (-118.648433966, -29.676067808))
            ThreePointArc((-118.648433966, -29.676067808), (-118.31752734, -29.093684949), (-118.007354532, -28.5))
        make_face()
    # profile 5 of 17: a face of its own
    with BuildSketch(Plane.XZ):
        with BuildLine():
            ThreePointArc((-116, -20), (-116.508647103, -24.366906005), (-118.007354532, -28.5))
            Line((-118.007354532, -28.5), (-116.585940529, -28.5))
            Line((-116.585940529, -28.5), (-103.051375803, -28.5))
            ThreePointArc((-103.051375803, -28.5), (-109.929952581, -0.24438961), (-105.519238022, 28.5))
            Line((-105.519238022, 28.5), (-116.585940529, 28.5))
            Line((-116.585940529, 28.5), (-118.007354532, 28.5))
            ThreePointArc((-118.007354532, 28.5), (-116.508647103, 24.366906005), (-116, 20))
            ThreePointArc((-116, 20), (-118.401807327, 10.753378996), (-125, 3.844505579))
            Line((-125, 3.844505579), (-125, 0))
            Line((-125, 0), (-125, -3.844505579))
            ThreePointArc((-125, -3.844505579), (-118.401807327, -10.753378996), (-116, -20))
        make_face()
    # profile 6 of 17: a face of its own
    with BuildSketch(Plane.XZ):
        with BuildLine():
            ThreePointArc((-105.519238022, 28.5), (-109.929952581, -0.24438961), (-103.051375803, -28.5))
            Line((-103.051375803, -28.5), (-2.396551708, -28.5))
            ThreePointArc((-2.396551708, -28.5), (-4.091169705, -24.408830306), (0, -26.103448276))
            Line((0, -26.103448276), (0, -9.896551726))
            Line((0, -9.896551726), (0, -7.5))
            Line((0, -7.5), (0, 7.5))
            Line((0, 7.5), (0, 9.896551721))
            Line((0, 9.896551721), (0, 26.103448276))
            ThreePointArc((0, 26.103448276), (-4.0911697, 24.4088303), (-2.396551724, 28.5))
            Line((-2.396551724, 28.5), (-105.519238022, 28.5))
        make_face()
        with Locations(Location((-85.7, -22.3, 0), (0, 0, 270))):
            Circle(SKETCH9_R, mode=Mode.SUBTRACT)
        with Locations((-40.6, -9)):
            Circle(SKETCH9_R, mode=Mode.SUBTRACT)
        with Locations((-20.7, -8.3)):
            Circle(SKETCH9_R, mode=Mode.SUBTRACT)
        with Locations(Location((-90.7, 0.1, 0), (0, 0, 270))):
            Circle(SKETCH9_R, mode=Mode.SUBTRACT)
        with Locations((-31.2, 8.7)):
            Circle(SKETCH9_R, mode=Mode.SUBTRACT)
        with Locations(Location((-88.7, 22, 0), (0, 0, 270))):
            Circle(SKETCH9_R, mode=Mode.SUBTRACT)
    # profile 7 of 17: a face of its own
    with BuildSketch(Plane.XZ):
        with BuildLine():
            Line((0, 7.5), (0, -7.5))
            Line((0, -7.5), (2.396551724, -7.5))
            Line((2.396551724, -7.5), (109.884558849, -7.5))
            ThreePointArc((109.884558849, -7.5), (109.971134466, -5.360654062), (110, -3.219751644))
            ThreePointArc((110, -3.219751644), (109.818069102, 2.15243237), (109.273110049, 7.5))
            Line((109.273110049, 7.5), (2.396551724, 7.5))
            Line((2.396551724, 7.5), (0, 7.5))
        make_face()
        with Locations((61.6, -1.7)):
            Circle(SKETCH9_R, mode=Mode.SUBTRACT)
    # profile 8 of 17: a face of its own
    with BuildSketch(Plane.XZ):
        with Locations((-2.396551724, -26.103448276)):
            Circle(SKETCH9_R_2)
    # profile 9 of 17: a face of its own
    with BuildSketch(Plane.XZ):
        with Locations((-2.396551724, 26.103448276)):
            Circle(SKETCH9_R_2)
    # profile 10 of 17: a face of its own
    with BuildSketch(Plane.XZ):
        with BuildLine():
            ThreePointArc((2.396551724, 7.5), (0.70193375, 8.201933747), (0, 9.896551721))
            Line((0, 9.896551721), (0, 7.5))
            Line((0, 7.5), (2.396551724, 7.5))
        make_face()
    # profile 11 of 17: a face of its own
    with BuildSketch(Plane.XZ):
        with BuildLine():
            Line((0, -7.5), (0, -9.896551726))
            ThreePointArc((0, -9.896551726), (0.701933748, -8.201933749), (2.396551724, -7.5))
            Line((2.396551724, -7.5), (0, -7.5))
        make_face()
    # profile 12 of 17: a face of its own
    with BuildSketch(Plane.XZ):
        with BuildLine():
            Line((-125, -3.844505579), (-125, -28.5))
            Line((-125, -28.5), (-118.007354532, -28.5))
            ThreePointArc((-118.007354532, -28.5), (-116.508647103, -24.366906005), (-116, -20))
            ThreePointArc((-116, -20), (-118.401807327, -10.753378996), (-125, -3.844505579))
        make_face()
    # profile 13 of 17: a face of its own
    with BuildSketch(Plane.XZ):
        with BuildLine():
            Line((-118.007354532, -28.5), (-125, -28.5))
            Line((-125, -28.5), (-125, -3.844505579))
            ThreePointArc((-125, -3.844505579), (-126.58576708, -2.964722357), (-128.248187023, -2.240128899))
            ThreePointArc((-128.248187023, -2.240128899), (-152.933884587, -26.275012638), (-118.648433966, -29.676067808))
            ThreePointArc((-118.648433966, -29.676067808), (-118.31752734, -29.093684949), (-118.007354532, -28.5))
        make_face()
    # profile 14 of 17: a face of its own
    with BuildSketch(Plane.XZ):
        with BuildLine():
            ThreePointArc((-128.248186972, 2.240128918), (-126.585767055, 2.964722369), (-125, 3.844505579))
            Line((-125, 3.844505579), (-125, 28.5))
            Line((-125, 28.5), (-118.007354532, 28.5))
            ThreePointArc((-118.007354532, 28.5), (-118.317527246, 29.093684777), (-118.648433766, 29.67606747))
            ThreePointArc((-118.648433766, 29.67606747), (-152.933884531, 26.275012798), (-128.248186972, 2.240128918))
        make_face()
    # profile 15 of 17: a face of its own
    with BuildSketch(Plane.XZ):
        with BuildLine():
            Line((-125, 28.5), (-125, 3.844505579))
            ThreePointArc((-125, 3.844505579), (-118.401807327, 10.753378996), (-116, 20))
            ThreePointArc((-116, 20), (-116.508647103, 24.366906005), (-118.007354532, 28.5))
            Line((-118.007354532, 28.5), (-125, 28.5))
        make_face()
    # profile 16 of 17: a face of its own
    with BuildSketch(Plane.XZ):
        with BuildLine():
            ThreePointArc((-128.248186972, 2.240128918), (-126.035950342, 1.972872029), (-125, 0))
            Line((-125, 0), (-125, 3.844505579))
            ThreePointArc((-125, 3.844505579), (-126.585767055, 2.964722369), (-128.248186972, 2.240128918))
        make_face()
    # profile 17 of 17: a face of its own
    with BuildSketch(Plane.XZ):
        with BuildLine():
            ThreePointArc((-128.248187023, -2.240128899), (-126.58576708, -2.964722357), (-125, -3.844505579))
            Line((-125, -3.844505579), (-125, 0))
            ThreePointArc((-125, 0), (-126.035950364, -1.972872045), (-128.248187023, -2.240128899))
        make_face()
    extrude(amount=-CUT_EXTRUDE7_DEPTH)


with BuildPart() as part_1:
    add(part.part)

    # Cut-Extrude7: cut by cut_extrude7_tool
    add(cut_extrude7_tool.part, mode=Mode.SUBTRACT)


with BuildPart() as body_2_1:
    add(body_2.part)

    # Cut-Extrude7: cut by cut_extrude7_tool
    add(cut_extrude7_tool.part, mode=Mode.SUBTRACT)

    # Sketch12 → Cut-Extrude8 (cut)
    with BuildSketch(Plane.XZ.offset(CUT_EXTRUDE8_START)):
        with Locations(Location((-135, -20, 0), (0, 0, 333.425030481))):
            Circle(SKETCH12_R)
        with Locations(Location((-135, 20, 0), (0, 0, 290.815422625))):
            Circle(SKETCH12_R)
    extrude(amount=CUT_EXTRUDE8_DEPTH, mode=Mode.SUBTRACT)


solid = Compound([part_1.part, body_2_1.part])
